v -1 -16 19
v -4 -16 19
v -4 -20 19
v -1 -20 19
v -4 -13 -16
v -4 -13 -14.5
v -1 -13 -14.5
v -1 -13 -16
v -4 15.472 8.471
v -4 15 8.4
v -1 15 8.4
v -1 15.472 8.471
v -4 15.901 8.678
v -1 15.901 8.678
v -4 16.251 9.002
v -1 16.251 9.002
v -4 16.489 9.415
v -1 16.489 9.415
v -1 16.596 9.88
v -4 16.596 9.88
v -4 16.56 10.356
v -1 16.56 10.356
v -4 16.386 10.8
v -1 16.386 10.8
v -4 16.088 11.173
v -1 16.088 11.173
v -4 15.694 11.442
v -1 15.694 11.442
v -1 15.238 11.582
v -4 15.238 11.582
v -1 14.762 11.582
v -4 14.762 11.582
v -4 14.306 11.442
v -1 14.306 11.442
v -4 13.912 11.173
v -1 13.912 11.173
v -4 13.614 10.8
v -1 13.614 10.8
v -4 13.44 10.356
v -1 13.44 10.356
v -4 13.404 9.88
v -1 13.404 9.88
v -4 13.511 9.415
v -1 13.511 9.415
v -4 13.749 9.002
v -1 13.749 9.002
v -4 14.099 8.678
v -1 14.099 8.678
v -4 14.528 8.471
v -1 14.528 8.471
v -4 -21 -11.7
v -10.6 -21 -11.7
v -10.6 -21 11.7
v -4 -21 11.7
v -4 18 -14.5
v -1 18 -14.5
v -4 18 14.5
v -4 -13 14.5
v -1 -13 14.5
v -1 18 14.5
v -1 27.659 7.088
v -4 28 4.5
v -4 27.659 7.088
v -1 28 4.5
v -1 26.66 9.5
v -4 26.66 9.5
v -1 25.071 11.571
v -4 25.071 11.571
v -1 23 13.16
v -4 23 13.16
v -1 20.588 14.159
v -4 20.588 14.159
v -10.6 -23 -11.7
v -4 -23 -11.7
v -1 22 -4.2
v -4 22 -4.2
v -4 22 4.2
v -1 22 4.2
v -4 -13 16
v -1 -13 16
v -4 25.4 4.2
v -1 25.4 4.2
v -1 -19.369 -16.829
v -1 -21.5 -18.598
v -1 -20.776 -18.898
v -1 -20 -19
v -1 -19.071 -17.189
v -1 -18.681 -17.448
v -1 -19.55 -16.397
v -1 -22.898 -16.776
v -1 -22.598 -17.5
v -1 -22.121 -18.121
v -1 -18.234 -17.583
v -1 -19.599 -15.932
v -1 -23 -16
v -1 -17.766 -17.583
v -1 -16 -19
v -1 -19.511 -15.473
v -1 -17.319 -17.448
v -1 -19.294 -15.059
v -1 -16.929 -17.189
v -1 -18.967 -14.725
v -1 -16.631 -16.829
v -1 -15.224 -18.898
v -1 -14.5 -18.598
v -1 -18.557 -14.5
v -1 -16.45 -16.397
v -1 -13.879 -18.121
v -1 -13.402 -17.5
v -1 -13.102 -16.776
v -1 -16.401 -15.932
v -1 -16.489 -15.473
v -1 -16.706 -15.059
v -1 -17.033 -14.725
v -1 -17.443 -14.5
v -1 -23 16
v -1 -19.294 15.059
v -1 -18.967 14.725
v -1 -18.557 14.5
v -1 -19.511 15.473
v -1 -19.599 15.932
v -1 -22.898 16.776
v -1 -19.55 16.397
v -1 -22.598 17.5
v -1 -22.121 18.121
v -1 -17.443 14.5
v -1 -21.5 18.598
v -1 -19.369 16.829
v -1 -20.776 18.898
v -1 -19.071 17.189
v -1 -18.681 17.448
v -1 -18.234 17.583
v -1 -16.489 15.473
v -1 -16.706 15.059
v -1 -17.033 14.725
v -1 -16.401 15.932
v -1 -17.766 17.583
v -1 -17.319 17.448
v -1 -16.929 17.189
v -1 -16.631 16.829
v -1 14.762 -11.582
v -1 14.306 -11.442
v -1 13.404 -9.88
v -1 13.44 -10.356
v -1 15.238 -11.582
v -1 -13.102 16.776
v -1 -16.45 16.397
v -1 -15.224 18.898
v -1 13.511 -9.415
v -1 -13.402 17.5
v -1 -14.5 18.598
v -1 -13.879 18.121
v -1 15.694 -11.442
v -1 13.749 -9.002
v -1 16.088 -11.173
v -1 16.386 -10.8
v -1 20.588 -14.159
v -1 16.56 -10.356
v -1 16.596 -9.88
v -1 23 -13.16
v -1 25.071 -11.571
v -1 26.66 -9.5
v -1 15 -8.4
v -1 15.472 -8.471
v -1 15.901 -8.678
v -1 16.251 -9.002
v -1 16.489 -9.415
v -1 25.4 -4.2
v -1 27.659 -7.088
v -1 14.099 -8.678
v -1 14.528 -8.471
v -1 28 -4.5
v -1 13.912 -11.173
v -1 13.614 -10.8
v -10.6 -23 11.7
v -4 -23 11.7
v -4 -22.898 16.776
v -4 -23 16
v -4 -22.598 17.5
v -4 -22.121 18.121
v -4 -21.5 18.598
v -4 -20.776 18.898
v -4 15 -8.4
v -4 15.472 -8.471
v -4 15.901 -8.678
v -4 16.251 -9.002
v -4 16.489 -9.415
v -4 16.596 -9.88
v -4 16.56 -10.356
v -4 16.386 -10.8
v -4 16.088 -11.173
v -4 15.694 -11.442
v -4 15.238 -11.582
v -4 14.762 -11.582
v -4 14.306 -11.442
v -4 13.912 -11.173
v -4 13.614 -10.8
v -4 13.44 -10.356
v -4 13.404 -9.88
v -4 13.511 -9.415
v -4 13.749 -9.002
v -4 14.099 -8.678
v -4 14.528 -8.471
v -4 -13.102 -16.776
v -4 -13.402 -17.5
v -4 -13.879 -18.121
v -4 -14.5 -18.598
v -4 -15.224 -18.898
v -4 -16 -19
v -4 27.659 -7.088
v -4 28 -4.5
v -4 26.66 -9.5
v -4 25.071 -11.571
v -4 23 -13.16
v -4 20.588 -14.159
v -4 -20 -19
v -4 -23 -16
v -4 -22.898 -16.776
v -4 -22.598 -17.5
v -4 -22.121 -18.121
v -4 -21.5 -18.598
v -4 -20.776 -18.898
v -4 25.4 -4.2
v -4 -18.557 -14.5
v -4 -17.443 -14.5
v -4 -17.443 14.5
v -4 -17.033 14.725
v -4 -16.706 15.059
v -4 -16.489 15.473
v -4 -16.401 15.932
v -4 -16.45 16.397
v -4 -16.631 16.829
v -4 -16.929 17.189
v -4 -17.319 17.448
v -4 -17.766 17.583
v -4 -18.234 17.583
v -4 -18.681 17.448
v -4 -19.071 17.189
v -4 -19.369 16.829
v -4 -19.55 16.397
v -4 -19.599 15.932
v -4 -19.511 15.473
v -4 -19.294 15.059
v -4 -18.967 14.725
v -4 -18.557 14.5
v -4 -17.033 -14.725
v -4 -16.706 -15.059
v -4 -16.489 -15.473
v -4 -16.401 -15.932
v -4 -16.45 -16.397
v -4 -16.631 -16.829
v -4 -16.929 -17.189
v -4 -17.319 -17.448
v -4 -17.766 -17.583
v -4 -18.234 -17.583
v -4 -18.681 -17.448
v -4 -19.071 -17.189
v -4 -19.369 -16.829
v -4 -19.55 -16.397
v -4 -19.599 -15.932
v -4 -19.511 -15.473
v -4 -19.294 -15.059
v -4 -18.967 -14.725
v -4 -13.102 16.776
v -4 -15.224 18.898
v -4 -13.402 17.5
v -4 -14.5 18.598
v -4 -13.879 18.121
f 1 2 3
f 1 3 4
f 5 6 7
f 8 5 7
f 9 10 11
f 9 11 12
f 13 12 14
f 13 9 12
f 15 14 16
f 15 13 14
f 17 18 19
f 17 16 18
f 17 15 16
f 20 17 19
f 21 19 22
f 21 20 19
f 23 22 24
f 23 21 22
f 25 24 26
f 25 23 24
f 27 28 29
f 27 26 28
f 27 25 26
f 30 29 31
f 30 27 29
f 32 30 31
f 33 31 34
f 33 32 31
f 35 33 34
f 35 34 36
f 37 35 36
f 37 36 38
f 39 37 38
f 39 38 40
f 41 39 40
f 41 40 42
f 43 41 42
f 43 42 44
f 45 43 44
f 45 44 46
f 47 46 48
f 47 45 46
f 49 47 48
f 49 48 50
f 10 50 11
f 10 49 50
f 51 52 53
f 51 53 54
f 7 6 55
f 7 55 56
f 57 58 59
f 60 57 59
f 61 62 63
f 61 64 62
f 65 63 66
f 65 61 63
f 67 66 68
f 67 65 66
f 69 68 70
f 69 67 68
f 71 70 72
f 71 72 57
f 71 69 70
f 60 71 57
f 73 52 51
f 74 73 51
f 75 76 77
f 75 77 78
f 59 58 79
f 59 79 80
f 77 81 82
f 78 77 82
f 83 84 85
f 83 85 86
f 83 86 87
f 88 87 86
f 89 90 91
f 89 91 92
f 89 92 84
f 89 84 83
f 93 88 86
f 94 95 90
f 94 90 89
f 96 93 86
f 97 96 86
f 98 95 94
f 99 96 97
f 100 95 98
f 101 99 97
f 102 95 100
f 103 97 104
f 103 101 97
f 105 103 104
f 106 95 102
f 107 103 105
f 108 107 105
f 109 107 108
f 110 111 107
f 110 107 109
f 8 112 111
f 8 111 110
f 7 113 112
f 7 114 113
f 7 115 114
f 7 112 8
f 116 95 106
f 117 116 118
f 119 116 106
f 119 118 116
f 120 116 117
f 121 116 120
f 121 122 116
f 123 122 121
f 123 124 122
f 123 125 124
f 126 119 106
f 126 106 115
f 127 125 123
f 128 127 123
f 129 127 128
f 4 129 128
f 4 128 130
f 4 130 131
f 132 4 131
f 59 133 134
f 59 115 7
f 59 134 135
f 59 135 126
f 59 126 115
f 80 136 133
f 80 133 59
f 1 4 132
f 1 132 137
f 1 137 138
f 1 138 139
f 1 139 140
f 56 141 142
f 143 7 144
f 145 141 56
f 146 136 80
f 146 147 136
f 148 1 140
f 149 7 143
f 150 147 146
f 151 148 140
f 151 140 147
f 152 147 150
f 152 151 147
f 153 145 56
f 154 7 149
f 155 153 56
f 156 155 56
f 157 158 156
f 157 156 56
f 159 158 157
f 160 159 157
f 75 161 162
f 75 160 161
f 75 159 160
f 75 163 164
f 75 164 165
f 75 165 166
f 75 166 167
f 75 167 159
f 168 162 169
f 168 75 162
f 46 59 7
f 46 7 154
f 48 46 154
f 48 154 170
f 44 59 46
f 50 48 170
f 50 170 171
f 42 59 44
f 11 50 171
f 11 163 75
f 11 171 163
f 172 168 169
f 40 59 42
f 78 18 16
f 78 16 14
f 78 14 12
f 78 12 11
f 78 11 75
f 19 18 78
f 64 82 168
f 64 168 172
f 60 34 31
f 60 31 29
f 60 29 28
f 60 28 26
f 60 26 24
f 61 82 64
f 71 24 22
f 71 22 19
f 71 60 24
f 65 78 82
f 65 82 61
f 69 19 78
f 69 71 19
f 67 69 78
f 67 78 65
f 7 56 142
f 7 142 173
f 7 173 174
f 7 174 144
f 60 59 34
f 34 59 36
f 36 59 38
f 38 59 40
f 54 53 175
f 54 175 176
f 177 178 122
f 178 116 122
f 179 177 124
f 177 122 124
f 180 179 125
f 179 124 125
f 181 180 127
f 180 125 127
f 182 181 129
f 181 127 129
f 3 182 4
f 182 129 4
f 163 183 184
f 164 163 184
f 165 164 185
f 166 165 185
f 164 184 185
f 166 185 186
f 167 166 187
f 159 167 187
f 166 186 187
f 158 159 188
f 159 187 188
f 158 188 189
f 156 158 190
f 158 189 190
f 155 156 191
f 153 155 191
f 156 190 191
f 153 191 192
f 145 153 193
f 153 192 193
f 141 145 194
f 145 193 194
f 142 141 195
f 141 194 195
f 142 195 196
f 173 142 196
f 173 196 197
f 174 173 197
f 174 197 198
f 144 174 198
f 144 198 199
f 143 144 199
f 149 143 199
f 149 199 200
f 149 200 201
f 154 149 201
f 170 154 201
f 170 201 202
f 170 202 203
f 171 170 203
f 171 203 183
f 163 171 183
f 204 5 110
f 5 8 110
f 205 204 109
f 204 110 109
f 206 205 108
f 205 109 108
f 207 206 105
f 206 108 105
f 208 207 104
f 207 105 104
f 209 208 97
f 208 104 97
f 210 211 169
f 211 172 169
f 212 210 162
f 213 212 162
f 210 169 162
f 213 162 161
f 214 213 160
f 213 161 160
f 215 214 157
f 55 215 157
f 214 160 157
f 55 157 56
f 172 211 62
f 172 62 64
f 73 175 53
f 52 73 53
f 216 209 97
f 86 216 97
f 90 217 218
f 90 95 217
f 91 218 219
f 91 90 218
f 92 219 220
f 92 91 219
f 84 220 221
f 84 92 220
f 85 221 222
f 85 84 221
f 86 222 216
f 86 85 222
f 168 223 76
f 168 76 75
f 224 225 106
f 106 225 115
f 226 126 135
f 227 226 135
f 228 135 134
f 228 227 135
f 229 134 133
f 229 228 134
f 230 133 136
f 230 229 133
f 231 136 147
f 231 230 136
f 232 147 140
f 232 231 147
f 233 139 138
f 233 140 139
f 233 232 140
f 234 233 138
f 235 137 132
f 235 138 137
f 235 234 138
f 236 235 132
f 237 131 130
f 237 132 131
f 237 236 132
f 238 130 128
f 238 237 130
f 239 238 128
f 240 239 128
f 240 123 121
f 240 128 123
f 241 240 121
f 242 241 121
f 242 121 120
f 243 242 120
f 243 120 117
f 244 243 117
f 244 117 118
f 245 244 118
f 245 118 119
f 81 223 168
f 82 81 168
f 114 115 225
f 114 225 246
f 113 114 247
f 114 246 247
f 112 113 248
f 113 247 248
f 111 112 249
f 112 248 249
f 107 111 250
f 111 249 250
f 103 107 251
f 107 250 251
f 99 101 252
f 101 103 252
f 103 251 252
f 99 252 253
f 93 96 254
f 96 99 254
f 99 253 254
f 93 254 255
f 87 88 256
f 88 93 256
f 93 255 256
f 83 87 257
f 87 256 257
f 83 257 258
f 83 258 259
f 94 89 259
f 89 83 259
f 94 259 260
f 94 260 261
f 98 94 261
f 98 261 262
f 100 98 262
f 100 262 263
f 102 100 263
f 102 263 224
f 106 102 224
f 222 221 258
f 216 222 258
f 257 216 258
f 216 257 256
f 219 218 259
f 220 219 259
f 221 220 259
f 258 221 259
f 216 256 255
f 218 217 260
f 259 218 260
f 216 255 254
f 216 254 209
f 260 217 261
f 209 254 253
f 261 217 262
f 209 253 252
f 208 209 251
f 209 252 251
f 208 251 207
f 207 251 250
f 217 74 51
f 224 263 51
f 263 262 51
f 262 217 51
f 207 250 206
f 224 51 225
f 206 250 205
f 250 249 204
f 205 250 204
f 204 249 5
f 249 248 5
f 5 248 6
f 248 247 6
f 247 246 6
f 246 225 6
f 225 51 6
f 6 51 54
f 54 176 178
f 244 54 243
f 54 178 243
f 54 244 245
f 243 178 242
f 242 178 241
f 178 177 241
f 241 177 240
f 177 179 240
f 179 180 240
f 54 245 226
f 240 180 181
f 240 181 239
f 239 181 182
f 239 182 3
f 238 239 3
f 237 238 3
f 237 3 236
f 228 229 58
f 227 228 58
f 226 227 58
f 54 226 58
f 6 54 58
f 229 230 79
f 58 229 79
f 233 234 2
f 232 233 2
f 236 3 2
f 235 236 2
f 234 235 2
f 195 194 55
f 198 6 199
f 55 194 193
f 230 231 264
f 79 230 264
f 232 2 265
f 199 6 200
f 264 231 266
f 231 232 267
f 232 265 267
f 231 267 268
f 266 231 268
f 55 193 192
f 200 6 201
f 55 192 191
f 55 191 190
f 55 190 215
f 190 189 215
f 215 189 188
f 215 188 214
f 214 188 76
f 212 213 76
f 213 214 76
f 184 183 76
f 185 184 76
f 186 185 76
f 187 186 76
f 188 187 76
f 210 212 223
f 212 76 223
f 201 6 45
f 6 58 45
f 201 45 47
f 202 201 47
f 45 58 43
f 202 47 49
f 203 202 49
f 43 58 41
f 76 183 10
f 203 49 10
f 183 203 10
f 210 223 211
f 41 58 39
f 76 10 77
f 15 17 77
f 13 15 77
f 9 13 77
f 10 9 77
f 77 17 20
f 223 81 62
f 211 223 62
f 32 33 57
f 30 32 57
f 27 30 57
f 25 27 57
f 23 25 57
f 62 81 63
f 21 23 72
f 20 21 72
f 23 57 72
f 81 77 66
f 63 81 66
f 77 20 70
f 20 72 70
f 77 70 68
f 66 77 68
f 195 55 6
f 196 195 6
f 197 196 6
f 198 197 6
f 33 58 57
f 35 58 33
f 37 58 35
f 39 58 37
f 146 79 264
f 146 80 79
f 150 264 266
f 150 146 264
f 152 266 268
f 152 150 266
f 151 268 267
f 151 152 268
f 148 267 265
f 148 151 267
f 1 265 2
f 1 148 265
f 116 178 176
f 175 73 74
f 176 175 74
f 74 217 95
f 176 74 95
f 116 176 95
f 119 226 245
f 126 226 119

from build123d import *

# Parameters (mm, degrees)
CYLINDER004_R     = 1.6
CYLINDER004_DEPTH = 7
BOX008_W          = 11
BOX008_H          = 3.4
BOX008_DEPTH      = 8.4
CYLINDER003_R     = 1.6
CYLINDER003_DEPTH = 7
BOX007_W          = 3
BOX007_H          = 10
BOX007_DEPTH      = 6
FILLET003_R       = 3
BOX009_W          = 9
BOX009_H          = 2
BOX009_DEPTH      = 23.4
BOX006_W          = 3
BOX006_H          = 51
BOX006_DEPTH      = 29
FILLET002_R       = 10


with BuildPart() as screw_hole_cylinder003:
    # Cylinder004 → Cylinder004 (new body)
    with BuildSketch(Plane(origin=(-6, 15, 10), x_dir=(0, 0, -1), z_dir=(1, 0, 0))):
        Circle(CYLINDER004_R)
    extrude(amount=CYLINDER004_DEPTH)


with BuildPart() as wire_extract_cube001:
    # Box008 → Box008 (new body)
    with BuildSketch(Plane(origin=(-4, 22, -4.2), x_dir=(1, 0, 0), z_dir=(0, 0, 1))):
        with Locations((5.5, 1.7)):
            Rectangle(BOX008_W, BOX008_H)
    extrude(amount=BOX008_DEPTH)


with BuildPart() as cover_extract_fusion:
    # Part__Mirroring004: instance of screw hole cylinder003
    add(screw_hole_cylinder003.part.mirror(Plane(origin=(0, 0, 0), x_dir=(0, 1, 0), z_dir=(0, 0, 1))))

    # Fusion002: union screw hole cylinder003, wire extract cube001
    add(screw_hole_cylinder003.part)
    add(wire_extract_cube001.part)


with BuildPart() as screw_hole_cylinder002:
    # Cylinder003 → Cylinder003 (new body)
    with BuildSketch(Plane(origin=(-7, -18, 16), x_dir=(0, 0, -1), z_dir=(1, 0, 0))):
        Circle(CYLINDER003_R)
    extrude(amount=CYLINDER003_DEPTH)


with BuildPart() as cut002:
    # Box007 → Box007 (new body)
    with BuildSketch(Plane(origin=(-4, -23, 13), x_dir=(1, 0, 0), z_dir=(0, 0, 1))):
        with Locations((1.5, 5)):
            Rectangle(BOX007_W, BOX007_H)
    extrude(amount=BOX007_DEPTH)

    # Fillet003
    fillet003_edges = [cut002.edges().sort_by_distance(p)[0] for p in [
        (-2.5, -23, 19),
        (-2.5, -13, 19),
    ]]
    fillet(fillet003_edges, radius=FILLET003_R)

    # Cut002: cut screw hole cylinder002
    add(screw_hole_cylinder002.part, mode=Mode.SUBTRACT)


with BuildPart() as part_mirroring003:
    # Part__Mirroring003: instance of Cut002
    add(cut002.part.mirror(Plane(origin=(0, 0, 0), x_dir=(0, 1, 0), z_dir=(0, 0, 1))))


with BuildPart() as external_cube_border:
    # Box009 → Box009 (new body)
    with BuildSketch(Plane(origin=(-10.6, -23, -11.7), x_dir=(1, 0, 0), z_dir=(0, 0, 1))):
        with Locations((4.5, 1)):
            Rectangle(BOX009_W, BOX009_H)
    extrude(amount=BOX009_DEPTH)


with BuildPart() as cover_cut:
    # Box006 → Box006 (new body)
    with BuildSketch(Plane(origin=(-4, -23, -14.5), x_dir=(1, 0, 0), z_dir=(0, 0, 1))):
        with Locations((1.5, 25.5)):
            Rectangle(BOX006_W, BOX006_H)
    extrude(amount=BOX006_DEPTH)

    # Fillet002
    fillet002_edges = [cover_cut.edges().sort_by_distance(p)[0] for p in [
        (-2.5, 28, -14.5),
        (-2.5, 28, 14.5),
    ]]
    fillet(fillet002_edges, radius=FILLET002_R)

    # Fusion003: union Part__Mirroring003, Cut002, external cube border
    add(part_mirroring003.part)
    add(cut002.part)
    add(external_cube_border.part)

    # Cut003: cut cover extract fusion
    add(cover_extract_fusion.part, mode=Mode.SUBTRACT)


solid = cover_cut.part
